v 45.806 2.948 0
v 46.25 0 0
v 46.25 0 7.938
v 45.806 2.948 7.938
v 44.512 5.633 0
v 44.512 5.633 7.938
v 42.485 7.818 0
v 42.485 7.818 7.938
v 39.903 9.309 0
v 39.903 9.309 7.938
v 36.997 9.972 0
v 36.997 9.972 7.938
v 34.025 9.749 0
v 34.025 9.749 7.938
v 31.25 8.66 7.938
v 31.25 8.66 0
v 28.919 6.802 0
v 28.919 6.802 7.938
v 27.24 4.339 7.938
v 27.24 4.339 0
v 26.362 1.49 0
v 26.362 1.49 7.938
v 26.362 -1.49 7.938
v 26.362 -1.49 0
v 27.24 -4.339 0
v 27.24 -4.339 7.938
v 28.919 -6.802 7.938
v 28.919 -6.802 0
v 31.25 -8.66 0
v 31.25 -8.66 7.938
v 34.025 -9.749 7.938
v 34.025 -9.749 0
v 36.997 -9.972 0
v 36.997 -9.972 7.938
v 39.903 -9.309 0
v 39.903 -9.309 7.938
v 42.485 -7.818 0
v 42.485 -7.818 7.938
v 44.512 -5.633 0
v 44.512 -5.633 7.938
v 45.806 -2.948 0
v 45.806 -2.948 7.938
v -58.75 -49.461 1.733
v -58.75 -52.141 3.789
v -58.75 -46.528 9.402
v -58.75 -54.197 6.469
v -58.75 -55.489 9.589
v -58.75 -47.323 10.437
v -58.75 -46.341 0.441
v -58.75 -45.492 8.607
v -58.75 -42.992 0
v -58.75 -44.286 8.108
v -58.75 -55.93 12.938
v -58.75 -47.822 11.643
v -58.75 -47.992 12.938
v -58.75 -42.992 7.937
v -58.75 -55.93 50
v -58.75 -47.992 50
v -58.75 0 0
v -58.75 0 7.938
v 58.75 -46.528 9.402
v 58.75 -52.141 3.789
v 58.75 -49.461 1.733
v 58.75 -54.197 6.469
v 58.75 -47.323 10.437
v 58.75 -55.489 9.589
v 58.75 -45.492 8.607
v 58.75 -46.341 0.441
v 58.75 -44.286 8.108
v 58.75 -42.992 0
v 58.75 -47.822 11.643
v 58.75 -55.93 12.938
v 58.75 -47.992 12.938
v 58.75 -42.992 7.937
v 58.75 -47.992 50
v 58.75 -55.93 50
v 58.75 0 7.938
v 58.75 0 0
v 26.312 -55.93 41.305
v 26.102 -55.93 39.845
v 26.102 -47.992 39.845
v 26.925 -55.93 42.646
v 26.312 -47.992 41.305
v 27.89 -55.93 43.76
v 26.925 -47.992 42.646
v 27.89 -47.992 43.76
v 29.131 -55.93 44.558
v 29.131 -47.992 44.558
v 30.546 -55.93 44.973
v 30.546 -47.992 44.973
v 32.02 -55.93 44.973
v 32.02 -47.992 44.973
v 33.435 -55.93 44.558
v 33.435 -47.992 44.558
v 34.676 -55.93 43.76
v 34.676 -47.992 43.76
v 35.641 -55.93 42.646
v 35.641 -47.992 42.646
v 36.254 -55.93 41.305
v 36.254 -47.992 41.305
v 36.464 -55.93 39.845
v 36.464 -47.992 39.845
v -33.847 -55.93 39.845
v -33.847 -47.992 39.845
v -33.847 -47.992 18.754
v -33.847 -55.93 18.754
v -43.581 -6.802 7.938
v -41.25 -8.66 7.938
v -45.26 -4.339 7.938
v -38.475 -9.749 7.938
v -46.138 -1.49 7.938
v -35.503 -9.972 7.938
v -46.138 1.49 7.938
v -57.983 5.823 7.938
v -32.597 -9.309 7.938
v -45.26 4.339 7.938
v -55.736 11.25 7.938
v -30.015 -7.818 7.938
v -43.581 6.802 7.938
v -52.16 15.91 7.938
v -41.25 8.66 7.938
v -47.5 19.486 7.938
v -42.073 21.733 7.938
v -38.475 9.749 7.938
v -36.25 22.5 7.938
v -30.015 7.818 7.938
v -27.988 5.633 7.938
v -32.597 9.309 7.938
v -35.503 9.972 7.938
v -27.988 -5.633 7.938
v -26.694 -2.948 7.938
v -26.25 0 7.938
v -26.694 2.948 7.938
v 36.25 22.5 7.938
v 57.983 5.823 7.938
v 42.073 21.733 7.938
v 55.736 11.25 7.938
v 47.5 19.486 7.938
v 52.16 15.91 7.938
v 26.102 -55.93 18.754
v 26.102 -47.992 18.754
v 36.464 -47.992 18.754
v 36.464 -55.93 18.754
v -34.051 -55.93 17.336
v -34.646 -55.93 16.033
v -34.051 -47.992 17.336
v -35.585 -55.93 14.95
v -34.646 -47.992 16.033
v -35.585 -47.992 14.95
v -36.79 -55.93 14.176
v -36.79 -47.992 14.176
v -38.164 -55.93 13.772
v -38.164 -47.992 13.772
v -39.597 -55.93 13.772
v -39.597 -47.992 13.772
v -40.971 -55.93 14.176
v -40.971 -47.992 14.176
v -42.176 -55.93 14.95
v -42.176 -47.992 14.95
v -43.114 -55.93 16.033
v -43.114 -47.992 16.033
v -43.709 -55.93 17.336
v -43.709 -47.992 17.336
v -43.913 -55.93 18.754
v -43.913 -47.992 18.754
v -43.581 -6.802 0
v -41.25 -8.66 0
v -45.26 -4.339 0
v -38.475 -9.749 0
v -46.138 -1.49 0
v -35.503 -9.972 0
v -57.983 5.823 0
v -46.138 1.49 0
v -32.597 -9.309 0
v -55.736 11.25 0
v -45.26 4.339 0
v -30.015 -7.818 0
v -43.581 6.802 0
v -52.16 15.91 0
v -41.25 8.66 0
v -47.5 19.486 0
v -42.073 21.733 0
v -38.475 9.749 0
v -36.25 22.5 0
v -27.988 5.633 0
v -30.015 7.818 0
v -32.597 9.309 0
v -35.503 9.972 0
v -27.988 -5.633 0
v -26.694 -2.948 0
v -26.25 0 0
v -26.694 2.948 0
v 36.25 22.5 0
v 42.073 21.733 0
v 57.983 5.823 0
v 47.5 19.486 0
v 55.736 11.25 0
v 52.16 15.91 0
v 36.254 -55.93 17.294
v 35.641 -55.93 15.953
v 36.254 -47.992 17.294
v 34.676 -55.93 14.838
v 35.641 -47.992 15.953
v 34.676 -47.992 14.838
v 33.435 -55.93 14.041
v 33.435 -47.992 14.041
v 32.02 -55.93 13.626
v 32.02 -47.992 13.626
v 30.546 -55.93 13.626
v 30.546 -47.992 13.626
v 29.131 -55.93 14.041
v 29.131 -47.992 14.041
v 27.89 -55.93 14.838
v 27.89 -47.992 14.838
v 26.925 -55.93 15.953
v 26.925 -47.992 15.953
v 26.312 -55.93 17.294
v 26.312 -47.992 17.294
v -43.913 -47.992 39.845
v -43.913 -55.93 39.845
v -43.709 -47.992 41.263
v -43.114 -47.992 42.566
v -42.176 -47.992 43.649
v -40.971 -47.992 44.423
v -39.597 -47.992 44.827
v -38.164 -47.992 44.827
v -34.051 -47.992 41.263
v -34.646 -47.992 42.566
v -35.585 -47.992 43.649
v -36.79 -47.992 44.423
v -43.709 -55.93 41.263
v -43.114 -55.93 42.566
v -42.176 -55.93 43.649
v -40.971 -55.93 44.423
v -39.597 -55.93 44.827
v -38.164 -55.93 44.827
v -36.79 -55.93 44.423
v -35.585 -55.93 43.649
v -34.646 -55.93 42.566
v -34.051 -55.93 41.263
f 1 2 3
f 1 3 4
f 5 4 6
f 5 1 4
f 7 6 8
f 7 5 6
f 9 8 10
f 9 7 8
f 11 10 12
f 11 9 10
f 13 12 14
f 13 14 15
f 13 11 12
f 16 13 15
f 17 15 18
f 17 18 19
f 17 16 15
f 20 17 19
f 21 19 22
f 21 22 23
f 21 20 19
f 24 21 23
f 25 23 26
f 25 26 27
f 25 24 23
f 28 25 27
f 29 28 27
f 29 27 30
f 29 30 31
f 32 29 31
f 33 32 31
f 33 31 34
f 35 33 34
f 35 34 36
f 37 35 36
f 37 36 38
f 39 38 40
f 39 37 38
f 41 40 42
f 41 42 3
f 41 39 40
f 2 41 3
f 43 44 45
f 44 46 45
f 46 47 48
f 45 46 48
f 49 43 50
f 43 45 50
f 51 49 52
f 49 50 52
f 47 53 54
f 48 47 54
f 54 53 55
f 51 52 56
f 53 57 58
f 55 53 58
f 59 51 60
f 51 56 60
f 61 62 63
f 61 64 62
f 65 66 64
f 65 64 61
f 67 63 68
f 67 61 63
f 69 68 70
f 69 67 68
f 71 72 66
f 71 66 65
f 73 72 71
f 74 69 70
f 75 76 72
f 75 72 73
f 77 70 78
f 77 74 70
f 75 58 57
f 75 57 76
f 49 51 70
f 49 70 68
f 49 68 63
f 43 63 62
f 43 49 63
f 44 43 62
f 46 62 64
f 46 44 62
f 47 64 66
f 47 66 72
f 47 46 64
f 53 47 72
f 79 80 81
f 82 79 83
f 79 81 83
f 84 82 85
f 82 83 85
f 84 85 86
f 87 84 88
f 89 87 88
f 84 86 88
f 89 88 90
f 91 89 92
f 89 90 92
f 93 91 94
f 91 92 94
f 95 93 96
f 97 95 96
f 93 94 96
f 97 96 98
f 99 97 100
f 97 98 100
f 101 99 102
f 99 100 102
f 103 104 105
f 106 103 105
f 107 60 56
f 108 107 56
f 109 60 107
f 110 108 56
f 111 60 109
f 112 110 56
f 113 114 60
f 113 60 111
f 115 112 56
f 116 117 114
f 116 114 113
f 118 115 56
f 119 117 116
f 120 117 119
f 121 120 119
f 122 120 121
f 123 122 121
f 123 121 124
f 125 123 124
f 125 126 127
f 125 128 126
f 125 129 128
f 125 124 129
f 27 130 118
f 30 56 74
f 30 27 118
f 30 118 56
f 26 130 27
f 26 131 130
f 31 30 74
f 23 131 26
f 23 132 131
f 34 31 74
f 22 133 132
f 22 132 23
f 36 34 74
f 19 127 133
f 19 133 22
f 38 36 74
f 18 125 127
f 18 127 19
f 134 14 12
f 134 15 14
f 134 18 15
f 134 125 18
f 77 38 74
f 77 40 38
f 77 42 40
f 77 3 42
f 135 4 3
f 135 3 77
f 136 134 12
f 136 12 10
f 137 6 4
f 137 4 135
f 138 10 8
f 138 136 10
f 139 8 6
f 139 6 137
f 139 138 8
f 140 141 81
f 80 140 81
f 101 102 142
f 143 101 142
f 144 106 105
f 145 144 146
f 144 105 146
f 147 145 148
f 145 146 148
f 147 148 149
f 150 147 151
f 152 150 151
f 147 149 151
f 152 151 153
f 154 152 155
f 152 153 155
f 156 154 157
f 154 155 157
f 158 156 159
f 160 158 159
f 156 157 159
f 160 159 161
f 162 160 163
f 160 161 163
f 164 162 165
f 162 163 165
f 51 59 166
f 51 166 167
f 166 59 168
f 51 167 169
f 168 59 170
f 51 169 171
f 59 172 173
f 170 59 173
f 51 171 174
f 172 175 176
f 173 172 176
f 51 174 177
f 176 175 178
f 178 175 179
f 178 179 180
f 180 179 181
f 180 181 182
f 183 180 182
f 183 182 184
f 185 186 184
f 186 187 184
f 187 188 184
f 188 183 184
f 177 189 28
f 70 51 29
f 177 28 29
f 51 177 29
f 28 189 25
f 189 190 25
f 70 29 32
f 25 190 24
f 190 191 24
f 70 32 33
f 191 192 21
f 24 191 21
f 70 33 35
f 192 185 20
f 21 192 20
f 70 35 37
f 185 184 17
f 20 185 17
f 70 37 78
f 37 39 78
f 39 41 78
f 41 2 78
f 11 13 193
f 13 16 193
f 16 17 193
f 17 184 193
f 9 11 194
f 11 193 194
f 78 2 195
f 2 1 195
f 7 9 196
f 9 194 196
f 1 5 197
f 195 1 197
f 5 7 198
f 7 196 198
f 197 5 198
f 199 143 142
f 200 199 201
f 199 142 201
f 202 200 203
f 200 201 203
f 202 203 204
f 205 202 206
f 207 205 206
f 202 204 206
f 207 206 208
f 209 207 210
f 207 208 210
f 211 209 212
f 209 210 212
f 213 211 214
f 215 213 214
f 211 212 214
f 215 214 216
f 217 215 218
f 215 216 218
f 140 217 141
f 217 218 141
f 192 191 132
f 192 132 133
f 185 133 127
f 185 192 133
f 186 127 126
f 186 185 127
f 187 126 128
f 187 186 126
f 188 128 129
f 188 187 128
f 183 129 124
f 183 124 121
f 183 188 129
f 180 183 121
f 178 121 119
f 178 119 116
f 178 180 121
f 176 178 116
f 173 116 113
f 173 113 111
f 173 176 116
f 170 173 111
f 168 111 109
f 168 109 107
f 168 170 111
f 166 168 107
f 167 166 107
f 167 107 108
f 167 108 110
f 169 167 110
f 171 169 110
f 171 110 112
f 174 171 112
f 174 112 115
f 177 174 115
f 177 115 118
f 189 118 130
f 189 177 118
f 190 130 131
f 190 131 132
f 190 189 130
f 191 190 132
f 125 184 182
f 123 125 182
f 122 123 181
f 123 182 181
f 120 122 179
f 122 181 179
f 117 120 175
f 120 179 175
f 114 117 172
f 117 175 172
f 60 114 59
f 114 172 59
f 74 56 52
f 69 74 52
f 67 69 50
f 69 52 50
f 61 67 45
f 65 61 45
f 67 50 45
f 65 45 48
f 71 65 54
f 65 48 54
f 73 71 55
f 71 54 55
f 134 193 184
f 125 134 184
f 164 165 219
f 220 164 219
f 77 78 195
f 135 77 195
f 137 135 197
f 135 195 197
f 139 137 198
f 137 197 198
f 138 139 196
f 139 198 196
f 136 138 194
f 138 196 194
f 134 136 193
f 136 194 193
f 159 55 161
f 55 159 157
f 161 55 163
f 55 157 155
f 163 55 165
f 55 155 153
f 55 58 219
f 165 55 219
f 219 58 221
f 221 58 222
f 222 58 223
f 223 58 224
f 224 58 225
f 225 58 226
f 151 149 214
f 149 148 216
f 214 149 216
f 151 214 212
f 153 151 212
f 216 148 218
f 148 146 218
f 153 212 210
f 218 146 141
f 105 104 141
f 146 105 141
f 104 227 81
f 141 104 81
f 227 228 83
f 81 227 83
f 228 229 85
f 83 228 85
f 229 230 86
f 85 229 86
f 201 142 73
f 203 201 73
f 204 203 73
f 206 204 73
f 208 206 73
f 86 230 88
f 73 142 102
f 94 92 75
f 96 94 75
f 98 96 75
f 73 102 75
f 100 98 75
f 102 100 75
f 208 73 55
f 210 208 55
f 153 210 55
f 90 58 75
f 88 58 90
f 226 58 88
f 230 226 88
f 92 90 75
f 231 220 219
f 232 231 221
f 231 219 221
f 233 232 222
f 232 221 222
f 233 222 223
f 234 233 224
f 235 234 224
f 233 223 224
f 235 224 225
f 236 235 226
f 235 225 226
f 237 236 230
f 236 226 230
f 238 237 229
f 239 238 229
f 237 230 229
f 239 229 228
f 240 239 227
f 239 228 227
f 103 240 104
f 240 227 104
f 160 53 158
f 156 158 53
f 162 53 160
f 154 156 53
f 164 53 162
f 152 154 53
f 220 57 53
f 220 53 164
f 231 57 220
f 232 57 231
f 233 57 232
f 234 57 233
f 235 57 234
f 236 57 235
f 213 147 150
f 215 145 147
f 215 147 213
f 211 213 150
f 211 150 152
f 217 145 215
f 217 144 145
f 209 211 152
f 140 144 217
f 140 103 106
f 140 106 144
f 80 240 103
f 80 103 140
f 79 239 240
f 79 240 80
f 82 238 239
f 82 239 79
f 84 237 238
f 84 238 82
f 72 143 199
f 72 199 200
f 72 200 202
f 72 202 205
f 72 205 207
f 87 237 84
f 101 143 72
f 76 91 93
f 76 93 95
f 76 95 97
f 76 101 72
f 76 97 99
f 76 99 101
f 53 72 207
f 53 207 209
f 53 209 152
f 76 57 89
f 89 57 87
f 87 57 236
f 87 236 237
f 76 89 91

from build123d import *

# Parameters (mm, degrees)
CROQUIS1_R                = 10
SALIENTE_EXTRUIR1_DEPTH   = 7.9375
CROQUIS3_W                = 117.5
CROQUIS3_H                = 50
SALIENTE_EXTRUIR2_DEPTH   = 7.9375
CONVERTIR_S_LIDO1_START   = -58.75
CONVERTIR_S_LIDO1_DEPTH   = 117.5
CONVERTIR_S_LIDO1_2_DEPTH = 117.5


# Read off the part's stored shape, not the designer's step: Convertir-Sólido1
with BuildPart() as part:
    # Croquis1 → Saliente-Extruir1 (new body)
    with BuildSketch(Plane.XY):
        with BuildLine():
            ThreePointArc((58.75, 0), (52.159902577, 15.909902577), (36.25, 22.5))
            Line((36.25, 22.5), (-36.25, 22.5))
            ThreePointArc((-36.25, 22.5), (-52.159902577, 15.909902577), (-58.75, 0))
            Line((-58.75, 0), (-58.75, -47.992399286))
            Line((-58.75, -47.992399286), (58.75, -47.992399286))
            Line((58.75, -47.992399286), (58.75, 0))
        make_face()
        with Locations((-36.25, 0)):
            Circle(CROQUIS1_R, mode=Mode.SUBTRACT)
        with Locations((36.25, 0)):
            Circle(CROQUIS1_R, mode=Mode.SUBTRACT)
    extrude(amount=SALIENTE_EXTRUIR1_DEPTH)

    # Croquis3 → Saliente-Extruir2 (add)
    with BuildSketch(Plane.XZ.offset(47.992399286)):
        with Locations((0, 25)):
            Rectangle(CROQUIS3_W, CROQUIS3_H)
        with BuildLine():
            Line((-33.847495585, 39.845079108), (-33.847495585, 18.753600712))
            ThreePointArc((-33.847495585, 18.753600712), (-38.88030023, 13.720796067), (-43.913104875, 18.753600712))
            Line((-43.913104875, 18.753600712), (-43.913104875, 39.845079108))
            ThreePointArc((-43.913104875, 39.845079108), (-38.88030023, 44.877883753), (-33.847495585, 39.845079108))
        make_face(mode=Mode.SUBTRACT)
        with BuildLine():
            Line((36.463745774, 39.845079108), (36.463745774, 18.753600712))
            ThreePointArc((36.463745774, 18.753600712), (31.282917463, 13.572772401), (26.102089152, 18.753600712))
            Line((26.102089152, 18.753600712), (26.102089152, 39.845079108))
            ThreePointArc((26.102089152, 39.845079108), (31.282917463, 45.025907419), (36.463745774, 39.845079108))
        make_face(mode=Mode.SUBTRACT)
    extrude(amount=SALIENTE_EXTRUIR2_DEPTH)

    # Convertir-Sólido1 outline → Convertir-Sólido1 (cut)
    with BuildSketch(Plane.YZ.offset(CONVERTIR_S_LIDO1_START)):
        with BuildLine():
            ThreePointArc((-42.992399286, 0), (-52.140593268, 3.789306019), (-55.929899286, 12.9375))
            Line((-55.929899286, 12.9375), (-55.929899286, 0))
            Line((-55.929899286, 0), (-42.992399286, 0))
        make_face()
    extrude(amount=CONVERTIR_S_LIDO1_DEPTH, mode=Mode.SUBTRACT)

    # Convertir-S_lido1 2 outline → Convertir-S_lido1 2 (add)
    with BuildSketch(Plane.YZ.offset(CONVERTIR_S_LIDO1_START)):
        with BuildLine():
            ThreePointArc((-42.992399286, 7.9375), (-46.527933192, 9.401966094), (-47.992399286, 12.9375))
            Line((-47.992399286, 12.9375), (-47.992399286, 7.9375))
            Line((-47.992399286, 7.9375), (-42.992399286, 7.9375))
        make_face()
    extrude(amount=CONVERTIR_S_LIDO1_2_DEPTH)


solid = part.part
